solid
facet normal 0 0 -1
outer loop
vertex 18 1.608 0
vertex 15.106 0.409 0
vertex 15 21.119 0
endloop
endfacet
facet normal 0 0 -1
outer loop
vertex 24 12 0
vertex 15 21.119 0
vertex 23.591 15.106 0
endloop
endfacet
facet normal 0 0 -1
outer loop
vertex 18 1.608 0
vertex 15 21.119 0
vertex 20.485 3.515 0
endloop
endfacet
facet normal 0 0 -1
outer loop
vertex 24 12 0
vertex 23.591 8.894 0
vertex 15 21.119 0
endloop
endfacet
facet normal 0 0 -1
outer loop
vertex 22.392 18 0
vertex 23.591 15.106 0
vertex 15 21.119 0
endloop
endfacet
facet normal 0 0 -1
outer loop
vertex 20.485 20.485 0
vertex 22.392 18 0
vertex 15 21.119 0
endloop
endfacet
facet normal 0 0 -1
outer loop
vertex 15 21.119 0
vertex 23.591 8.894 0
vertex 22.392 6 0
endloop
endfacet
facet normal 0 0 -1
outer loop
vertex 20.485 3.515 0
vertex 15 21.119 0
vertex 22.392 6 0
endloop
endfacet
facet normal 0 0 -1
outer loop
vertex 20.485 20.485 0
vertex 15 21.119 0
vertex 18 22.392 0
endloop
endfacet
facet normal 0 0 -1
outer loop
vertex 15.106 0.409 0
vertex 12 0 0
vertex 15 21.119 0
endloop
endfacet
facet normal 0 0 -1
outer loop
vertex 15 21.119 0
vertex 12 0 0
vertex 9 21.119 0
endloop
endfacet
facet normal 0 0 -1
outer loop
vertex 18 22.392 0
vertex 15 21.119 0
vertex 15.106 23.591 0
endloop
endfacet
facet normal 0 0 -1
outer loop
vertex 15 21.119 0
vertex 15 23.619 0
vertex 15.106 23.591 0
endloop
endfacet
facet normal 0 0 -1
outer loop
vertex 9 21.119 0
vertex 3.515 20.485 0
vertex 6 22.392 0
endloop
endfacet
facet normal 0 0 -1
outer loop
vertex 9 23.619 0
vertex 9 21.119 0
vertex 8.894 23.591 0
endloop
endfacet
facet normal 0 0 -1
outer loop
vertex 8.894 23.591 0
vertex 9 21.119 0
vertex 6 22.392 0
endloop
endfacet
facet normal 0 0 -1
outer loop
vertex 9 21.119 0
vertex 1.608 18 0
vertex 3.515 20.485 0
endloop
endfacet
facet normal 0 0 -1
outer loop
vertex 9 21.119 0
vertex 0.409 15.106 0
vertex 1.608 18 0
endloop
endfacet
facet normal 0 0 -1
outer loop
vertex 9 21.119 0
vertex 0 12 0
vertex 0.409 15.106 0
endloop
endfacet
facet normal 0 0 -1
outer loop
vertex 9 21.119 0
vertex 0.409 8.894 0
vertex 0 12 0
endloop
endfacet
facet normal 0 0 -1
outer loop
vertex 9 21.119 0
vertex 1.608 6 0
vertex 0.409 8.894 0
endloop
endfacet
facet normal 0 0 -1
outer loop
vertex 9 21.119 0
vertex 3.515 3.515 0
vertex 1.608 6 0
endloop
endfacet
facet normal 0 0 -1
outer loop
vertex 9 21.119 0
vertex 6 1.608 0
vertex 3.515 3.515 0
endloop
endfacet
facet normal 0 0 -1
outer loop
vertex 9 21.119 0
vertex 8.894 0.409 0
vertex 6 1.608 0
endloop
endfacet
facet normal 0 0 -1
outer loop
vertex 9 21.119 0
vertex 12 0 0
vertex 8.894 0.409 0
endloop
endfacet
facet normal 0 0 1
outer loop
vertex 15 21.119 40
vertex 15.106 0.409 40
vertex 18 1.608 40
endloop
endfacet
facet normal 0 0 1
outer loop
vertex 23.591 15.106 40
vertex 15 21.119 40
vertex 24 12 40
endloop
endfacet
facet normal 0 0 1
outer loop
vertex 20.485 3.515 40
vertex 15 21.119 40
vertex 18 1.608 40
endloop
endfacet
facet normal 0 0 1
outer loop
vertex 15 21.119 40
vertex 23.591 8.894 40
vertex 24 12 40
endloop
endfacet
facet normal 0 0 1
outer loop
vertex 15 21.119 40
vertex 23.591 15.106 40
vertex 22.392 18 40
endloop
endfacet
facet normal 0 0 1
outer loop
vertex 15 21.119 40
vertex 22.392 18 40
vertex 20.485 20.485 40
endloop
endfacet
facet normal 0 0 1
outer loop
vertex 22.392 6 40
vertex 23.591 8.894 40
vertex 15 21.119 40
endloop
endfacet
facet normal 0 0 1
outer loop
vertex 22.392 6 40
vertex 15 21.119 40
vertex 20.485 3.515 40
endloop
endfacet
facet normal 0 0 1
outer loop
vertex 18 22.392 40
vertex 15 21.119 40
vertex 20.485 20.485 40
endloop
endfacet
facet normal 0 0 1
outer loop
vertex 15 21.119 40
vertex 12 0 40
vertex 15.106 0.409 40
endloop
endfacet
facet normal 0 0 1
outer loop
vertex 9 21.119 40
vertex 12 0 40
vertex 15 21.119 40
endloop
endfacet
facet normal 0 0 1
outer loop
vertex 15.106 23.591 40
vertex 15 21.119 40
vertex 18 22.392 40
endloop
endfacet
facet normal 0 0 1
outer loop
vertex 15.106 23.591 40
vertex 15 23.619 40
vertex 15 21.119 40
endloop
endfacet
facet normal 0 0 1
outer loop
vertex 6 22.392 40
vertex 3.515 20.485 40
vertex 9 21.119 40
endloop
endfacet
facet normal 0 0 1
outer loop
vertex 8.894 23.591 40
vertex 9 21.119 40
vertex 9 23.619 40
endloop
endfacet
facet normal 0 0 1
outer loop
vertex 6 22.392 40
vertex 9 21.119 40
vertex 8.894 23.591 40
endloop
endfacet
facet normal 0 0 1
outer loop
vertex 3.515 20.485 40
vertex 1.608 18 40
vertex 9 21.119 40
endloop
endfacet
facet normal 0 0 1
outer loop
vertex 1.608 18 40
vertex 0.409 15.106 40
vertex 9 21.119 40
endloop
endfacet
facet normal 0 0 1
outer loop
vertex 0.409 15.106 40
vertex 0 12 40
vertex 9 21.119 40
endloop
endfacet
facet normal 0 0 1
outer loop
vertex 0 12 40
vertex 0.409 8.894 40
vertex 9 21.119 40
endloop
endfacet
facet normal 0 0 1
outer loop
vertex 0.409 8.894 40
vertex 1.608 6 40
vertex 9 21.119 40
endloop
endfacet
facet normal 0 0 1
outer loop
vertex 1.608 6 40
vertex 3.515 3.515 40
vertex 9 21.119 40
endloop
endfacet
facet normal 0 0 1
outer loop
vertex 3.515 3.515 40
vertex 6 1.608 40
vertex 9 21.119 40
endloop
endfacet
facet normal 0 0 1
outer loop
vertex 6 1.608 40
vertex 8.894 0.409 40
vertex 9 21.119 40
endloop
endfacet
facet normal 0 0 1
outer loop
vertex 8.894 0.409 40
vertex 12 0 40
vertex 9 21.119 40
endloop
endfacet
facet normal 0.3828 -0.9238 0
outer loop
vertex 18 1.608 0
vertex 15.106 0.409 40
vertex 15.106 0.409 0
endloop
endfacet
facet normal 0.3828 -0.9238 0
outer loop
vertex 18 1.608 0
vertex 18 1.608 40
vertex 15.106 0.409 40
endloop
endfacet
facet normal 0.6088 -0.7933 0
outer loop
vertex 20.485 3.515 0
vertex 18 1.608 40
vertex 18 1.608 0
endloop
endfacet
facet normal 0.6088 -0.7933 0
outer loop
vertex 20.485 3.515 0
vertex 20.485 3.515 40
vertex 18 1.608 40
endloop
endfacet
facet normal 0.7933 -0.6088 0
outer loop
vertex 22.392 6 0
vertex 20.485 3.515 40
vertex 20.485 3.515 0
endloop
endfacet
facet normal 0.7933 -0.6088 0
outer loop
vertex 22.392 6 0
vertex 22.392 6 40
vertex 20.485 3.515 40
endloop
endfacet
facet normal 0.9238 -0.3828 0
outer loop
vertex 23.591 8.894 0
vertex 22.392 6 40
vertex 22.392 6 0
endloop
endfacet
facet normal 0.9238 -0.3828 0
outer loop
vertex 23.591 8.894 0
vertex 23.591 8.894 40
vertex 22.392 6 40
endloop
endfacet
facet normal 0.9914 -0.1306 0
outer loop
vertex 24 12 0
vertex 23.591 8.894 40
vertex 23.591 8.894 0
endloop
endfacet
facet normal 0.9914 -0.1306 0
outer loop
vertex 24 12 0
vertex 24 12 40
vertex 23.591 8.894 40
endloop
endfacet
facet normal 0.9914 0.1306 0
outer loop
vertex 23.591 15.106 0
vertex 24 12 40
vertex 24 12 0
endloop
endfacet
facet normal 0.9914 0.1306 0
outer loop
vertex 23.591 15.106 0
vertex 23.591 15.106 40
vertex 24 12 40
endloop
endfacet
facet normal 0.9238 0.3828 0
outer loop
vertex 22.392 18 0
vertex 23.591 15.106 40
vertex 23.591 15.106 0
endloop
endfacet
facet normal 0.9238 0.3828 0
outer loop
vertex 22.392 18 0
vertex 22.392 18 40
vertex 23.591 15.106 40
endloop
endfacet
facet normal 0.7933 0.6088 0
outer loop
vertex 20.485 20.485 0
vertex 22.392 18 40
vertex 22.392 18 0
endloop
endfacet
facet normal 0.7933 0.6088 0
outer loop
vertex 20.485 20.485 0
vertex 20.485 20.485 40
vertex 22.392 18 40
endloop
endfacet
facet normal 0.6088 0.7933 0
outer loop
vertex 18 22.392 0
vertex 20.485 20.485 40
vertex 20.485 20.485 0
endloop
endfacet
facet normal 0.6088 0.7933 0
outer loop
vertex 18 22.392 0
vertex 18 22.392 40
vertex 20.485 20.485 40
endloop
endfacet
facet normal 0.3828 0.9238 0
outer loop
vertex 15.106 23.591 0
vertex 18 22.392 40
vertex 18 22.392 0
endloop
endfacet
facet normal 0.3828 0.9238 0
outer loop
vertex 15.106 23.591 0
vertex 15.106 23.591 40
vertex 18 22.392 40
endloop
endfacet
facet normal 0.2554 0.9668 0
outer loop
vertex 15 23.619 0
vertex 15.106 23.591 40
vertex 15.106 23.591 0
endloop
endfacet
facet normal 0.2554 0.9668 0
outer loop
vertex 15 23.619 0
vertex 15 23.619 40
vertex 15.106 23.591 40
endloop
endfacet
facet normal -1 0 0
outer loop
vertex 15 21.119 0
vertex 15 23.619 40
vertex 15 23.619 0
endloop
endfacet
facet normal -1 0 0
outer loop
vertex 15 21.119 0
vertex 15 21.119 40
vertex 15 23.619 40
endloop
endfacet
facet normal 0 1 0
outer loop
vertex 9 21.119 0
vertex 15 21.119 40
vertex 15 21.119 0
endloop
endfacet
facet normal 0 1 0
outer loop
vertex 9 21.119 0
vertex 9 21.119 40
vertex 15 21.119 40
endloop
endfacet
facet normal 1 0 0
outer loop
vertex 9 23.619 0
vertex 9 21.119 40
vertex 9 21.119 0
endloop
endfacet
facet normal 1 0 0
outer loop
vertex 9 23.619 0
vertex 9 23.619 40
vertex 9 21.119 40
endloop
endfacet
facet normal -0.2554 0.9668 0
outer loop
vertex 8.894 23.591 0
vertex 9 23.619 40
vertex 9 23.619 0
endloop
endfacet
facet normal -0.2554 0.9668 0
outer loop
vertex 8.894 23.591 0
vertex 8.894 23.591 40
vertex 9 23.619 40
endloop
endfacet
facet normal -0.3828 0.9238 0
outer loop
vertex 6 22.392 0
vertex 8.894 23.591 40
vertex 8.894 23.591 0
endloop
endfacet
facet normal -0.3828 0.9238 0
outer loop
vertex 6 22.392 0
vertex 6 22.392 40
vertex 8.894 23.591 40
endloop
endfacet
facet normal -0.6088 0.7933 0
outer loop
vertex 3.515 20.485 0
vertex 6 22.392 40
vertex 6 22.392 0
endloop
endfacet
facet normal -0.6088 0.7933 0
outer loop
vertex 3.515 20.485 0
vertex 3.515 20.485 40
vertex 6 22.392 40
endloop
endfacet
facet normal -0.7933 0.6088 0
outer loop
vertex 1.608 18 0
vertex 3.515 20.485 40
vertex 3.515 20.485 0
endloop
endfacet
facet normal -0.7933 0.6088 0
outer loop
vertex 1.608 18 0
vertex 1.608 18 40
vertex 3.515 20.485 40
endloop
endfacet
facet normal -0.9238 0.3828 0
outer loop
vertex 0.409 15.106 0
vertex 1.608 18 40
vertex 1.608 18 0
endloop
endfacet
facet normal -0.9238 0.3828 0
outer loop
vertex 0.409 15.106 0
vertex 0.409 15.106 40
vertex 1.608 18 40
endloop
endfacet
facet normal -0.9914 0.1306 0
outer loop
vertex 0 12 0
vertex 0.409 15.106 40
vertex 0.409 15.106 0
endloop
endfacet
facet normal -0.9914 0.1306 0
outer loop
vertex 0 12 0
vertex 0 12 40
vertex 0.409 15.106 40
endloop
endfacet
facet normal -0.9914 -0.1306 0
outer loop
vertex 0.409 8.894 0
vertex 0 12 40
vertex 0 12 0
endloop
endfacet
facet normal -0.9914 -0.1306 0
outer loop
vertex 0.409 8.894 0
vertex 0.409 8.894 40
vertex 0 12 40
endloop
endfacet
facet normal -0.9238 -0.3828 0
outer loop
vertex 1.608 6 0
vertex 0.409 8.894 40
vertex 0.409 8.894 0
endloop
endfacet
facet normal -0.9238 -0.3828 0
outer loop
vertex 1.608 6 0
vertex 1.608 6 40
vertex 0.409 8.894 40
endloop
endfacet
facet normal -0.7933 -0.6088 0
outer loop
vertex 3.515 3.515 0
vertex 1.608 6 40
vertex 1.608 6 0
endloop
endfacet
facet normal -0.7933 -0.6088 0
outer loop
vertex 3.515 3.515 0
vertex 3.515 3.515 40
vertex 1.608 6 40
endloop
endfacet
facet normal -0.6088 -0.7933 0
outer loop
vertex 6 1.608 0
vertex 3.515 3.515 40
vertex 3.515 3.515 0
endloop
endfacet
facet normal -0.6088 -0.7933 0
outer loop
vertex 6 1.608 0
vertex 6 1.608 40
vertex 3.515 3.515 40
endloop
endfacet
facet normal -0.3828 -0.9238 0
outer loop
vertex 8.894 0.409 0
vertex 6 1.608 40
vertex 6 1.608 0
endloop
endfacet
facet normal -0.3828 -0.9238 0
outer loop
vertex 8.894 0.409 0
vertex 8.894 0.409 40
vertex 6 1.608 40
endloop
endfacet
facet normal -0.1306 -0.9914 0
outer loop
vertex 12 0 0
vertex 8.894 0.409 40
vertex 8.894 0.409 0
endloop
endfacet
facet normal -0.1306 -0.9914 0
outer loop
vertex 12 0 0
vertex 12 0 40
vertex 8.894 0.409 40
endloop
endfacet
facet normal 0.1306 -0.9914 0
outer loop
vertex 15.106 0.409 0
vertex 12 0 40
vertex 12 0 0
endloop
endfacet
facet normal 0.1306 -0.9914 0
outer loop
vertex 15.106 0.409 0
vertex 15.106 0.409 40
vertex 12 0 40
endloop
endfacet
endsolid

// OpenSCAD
$fn = 32;

// ----------------------------------------------------------------------
// Keyway shaft: d24 shaft, key 6 x 2.5 mm
// ----------------------------------------------------------------------

// --- parameters (mm) ---
shaft_r = 12;             // shaft radius
key_w = 6;                // keyway width
key_d = 2.5;              // keyway depth below the surface line
plate_t = 40;             // shaft length, Z (extrusion height)

shaft_d = 2 * shaft_r;  // shaft diameter
circle_step = 15;  // polygon sampling step, degrees

profile = [[8.894, 23.591], [6, 22.392], [3.515, 20.485], [1.608, 18], [0.409, 15.106], [0, 12], [0.409, 8.894], [1.608, 6], [3.515, 3.515], [6, 1.608], [8.894, 0.409], [12, 0], [15.106, 0.409], [18, 1.608], [20.485, 3.515], [22.392, 6], [23.591, 8.894], [24, 12], [23.591, 15.106], [22.392, 18], [20.485, 20.485], [18, 22.392], [15.106, 23.591], [15, 23.619], [15, 21.119], [9, 21.119], [9, 23.619]];  // primary outline, 27 points, counter clockwise

// --- the one profile operation ---
linear_extrude(height = plate_t) polygon(points = profile);
